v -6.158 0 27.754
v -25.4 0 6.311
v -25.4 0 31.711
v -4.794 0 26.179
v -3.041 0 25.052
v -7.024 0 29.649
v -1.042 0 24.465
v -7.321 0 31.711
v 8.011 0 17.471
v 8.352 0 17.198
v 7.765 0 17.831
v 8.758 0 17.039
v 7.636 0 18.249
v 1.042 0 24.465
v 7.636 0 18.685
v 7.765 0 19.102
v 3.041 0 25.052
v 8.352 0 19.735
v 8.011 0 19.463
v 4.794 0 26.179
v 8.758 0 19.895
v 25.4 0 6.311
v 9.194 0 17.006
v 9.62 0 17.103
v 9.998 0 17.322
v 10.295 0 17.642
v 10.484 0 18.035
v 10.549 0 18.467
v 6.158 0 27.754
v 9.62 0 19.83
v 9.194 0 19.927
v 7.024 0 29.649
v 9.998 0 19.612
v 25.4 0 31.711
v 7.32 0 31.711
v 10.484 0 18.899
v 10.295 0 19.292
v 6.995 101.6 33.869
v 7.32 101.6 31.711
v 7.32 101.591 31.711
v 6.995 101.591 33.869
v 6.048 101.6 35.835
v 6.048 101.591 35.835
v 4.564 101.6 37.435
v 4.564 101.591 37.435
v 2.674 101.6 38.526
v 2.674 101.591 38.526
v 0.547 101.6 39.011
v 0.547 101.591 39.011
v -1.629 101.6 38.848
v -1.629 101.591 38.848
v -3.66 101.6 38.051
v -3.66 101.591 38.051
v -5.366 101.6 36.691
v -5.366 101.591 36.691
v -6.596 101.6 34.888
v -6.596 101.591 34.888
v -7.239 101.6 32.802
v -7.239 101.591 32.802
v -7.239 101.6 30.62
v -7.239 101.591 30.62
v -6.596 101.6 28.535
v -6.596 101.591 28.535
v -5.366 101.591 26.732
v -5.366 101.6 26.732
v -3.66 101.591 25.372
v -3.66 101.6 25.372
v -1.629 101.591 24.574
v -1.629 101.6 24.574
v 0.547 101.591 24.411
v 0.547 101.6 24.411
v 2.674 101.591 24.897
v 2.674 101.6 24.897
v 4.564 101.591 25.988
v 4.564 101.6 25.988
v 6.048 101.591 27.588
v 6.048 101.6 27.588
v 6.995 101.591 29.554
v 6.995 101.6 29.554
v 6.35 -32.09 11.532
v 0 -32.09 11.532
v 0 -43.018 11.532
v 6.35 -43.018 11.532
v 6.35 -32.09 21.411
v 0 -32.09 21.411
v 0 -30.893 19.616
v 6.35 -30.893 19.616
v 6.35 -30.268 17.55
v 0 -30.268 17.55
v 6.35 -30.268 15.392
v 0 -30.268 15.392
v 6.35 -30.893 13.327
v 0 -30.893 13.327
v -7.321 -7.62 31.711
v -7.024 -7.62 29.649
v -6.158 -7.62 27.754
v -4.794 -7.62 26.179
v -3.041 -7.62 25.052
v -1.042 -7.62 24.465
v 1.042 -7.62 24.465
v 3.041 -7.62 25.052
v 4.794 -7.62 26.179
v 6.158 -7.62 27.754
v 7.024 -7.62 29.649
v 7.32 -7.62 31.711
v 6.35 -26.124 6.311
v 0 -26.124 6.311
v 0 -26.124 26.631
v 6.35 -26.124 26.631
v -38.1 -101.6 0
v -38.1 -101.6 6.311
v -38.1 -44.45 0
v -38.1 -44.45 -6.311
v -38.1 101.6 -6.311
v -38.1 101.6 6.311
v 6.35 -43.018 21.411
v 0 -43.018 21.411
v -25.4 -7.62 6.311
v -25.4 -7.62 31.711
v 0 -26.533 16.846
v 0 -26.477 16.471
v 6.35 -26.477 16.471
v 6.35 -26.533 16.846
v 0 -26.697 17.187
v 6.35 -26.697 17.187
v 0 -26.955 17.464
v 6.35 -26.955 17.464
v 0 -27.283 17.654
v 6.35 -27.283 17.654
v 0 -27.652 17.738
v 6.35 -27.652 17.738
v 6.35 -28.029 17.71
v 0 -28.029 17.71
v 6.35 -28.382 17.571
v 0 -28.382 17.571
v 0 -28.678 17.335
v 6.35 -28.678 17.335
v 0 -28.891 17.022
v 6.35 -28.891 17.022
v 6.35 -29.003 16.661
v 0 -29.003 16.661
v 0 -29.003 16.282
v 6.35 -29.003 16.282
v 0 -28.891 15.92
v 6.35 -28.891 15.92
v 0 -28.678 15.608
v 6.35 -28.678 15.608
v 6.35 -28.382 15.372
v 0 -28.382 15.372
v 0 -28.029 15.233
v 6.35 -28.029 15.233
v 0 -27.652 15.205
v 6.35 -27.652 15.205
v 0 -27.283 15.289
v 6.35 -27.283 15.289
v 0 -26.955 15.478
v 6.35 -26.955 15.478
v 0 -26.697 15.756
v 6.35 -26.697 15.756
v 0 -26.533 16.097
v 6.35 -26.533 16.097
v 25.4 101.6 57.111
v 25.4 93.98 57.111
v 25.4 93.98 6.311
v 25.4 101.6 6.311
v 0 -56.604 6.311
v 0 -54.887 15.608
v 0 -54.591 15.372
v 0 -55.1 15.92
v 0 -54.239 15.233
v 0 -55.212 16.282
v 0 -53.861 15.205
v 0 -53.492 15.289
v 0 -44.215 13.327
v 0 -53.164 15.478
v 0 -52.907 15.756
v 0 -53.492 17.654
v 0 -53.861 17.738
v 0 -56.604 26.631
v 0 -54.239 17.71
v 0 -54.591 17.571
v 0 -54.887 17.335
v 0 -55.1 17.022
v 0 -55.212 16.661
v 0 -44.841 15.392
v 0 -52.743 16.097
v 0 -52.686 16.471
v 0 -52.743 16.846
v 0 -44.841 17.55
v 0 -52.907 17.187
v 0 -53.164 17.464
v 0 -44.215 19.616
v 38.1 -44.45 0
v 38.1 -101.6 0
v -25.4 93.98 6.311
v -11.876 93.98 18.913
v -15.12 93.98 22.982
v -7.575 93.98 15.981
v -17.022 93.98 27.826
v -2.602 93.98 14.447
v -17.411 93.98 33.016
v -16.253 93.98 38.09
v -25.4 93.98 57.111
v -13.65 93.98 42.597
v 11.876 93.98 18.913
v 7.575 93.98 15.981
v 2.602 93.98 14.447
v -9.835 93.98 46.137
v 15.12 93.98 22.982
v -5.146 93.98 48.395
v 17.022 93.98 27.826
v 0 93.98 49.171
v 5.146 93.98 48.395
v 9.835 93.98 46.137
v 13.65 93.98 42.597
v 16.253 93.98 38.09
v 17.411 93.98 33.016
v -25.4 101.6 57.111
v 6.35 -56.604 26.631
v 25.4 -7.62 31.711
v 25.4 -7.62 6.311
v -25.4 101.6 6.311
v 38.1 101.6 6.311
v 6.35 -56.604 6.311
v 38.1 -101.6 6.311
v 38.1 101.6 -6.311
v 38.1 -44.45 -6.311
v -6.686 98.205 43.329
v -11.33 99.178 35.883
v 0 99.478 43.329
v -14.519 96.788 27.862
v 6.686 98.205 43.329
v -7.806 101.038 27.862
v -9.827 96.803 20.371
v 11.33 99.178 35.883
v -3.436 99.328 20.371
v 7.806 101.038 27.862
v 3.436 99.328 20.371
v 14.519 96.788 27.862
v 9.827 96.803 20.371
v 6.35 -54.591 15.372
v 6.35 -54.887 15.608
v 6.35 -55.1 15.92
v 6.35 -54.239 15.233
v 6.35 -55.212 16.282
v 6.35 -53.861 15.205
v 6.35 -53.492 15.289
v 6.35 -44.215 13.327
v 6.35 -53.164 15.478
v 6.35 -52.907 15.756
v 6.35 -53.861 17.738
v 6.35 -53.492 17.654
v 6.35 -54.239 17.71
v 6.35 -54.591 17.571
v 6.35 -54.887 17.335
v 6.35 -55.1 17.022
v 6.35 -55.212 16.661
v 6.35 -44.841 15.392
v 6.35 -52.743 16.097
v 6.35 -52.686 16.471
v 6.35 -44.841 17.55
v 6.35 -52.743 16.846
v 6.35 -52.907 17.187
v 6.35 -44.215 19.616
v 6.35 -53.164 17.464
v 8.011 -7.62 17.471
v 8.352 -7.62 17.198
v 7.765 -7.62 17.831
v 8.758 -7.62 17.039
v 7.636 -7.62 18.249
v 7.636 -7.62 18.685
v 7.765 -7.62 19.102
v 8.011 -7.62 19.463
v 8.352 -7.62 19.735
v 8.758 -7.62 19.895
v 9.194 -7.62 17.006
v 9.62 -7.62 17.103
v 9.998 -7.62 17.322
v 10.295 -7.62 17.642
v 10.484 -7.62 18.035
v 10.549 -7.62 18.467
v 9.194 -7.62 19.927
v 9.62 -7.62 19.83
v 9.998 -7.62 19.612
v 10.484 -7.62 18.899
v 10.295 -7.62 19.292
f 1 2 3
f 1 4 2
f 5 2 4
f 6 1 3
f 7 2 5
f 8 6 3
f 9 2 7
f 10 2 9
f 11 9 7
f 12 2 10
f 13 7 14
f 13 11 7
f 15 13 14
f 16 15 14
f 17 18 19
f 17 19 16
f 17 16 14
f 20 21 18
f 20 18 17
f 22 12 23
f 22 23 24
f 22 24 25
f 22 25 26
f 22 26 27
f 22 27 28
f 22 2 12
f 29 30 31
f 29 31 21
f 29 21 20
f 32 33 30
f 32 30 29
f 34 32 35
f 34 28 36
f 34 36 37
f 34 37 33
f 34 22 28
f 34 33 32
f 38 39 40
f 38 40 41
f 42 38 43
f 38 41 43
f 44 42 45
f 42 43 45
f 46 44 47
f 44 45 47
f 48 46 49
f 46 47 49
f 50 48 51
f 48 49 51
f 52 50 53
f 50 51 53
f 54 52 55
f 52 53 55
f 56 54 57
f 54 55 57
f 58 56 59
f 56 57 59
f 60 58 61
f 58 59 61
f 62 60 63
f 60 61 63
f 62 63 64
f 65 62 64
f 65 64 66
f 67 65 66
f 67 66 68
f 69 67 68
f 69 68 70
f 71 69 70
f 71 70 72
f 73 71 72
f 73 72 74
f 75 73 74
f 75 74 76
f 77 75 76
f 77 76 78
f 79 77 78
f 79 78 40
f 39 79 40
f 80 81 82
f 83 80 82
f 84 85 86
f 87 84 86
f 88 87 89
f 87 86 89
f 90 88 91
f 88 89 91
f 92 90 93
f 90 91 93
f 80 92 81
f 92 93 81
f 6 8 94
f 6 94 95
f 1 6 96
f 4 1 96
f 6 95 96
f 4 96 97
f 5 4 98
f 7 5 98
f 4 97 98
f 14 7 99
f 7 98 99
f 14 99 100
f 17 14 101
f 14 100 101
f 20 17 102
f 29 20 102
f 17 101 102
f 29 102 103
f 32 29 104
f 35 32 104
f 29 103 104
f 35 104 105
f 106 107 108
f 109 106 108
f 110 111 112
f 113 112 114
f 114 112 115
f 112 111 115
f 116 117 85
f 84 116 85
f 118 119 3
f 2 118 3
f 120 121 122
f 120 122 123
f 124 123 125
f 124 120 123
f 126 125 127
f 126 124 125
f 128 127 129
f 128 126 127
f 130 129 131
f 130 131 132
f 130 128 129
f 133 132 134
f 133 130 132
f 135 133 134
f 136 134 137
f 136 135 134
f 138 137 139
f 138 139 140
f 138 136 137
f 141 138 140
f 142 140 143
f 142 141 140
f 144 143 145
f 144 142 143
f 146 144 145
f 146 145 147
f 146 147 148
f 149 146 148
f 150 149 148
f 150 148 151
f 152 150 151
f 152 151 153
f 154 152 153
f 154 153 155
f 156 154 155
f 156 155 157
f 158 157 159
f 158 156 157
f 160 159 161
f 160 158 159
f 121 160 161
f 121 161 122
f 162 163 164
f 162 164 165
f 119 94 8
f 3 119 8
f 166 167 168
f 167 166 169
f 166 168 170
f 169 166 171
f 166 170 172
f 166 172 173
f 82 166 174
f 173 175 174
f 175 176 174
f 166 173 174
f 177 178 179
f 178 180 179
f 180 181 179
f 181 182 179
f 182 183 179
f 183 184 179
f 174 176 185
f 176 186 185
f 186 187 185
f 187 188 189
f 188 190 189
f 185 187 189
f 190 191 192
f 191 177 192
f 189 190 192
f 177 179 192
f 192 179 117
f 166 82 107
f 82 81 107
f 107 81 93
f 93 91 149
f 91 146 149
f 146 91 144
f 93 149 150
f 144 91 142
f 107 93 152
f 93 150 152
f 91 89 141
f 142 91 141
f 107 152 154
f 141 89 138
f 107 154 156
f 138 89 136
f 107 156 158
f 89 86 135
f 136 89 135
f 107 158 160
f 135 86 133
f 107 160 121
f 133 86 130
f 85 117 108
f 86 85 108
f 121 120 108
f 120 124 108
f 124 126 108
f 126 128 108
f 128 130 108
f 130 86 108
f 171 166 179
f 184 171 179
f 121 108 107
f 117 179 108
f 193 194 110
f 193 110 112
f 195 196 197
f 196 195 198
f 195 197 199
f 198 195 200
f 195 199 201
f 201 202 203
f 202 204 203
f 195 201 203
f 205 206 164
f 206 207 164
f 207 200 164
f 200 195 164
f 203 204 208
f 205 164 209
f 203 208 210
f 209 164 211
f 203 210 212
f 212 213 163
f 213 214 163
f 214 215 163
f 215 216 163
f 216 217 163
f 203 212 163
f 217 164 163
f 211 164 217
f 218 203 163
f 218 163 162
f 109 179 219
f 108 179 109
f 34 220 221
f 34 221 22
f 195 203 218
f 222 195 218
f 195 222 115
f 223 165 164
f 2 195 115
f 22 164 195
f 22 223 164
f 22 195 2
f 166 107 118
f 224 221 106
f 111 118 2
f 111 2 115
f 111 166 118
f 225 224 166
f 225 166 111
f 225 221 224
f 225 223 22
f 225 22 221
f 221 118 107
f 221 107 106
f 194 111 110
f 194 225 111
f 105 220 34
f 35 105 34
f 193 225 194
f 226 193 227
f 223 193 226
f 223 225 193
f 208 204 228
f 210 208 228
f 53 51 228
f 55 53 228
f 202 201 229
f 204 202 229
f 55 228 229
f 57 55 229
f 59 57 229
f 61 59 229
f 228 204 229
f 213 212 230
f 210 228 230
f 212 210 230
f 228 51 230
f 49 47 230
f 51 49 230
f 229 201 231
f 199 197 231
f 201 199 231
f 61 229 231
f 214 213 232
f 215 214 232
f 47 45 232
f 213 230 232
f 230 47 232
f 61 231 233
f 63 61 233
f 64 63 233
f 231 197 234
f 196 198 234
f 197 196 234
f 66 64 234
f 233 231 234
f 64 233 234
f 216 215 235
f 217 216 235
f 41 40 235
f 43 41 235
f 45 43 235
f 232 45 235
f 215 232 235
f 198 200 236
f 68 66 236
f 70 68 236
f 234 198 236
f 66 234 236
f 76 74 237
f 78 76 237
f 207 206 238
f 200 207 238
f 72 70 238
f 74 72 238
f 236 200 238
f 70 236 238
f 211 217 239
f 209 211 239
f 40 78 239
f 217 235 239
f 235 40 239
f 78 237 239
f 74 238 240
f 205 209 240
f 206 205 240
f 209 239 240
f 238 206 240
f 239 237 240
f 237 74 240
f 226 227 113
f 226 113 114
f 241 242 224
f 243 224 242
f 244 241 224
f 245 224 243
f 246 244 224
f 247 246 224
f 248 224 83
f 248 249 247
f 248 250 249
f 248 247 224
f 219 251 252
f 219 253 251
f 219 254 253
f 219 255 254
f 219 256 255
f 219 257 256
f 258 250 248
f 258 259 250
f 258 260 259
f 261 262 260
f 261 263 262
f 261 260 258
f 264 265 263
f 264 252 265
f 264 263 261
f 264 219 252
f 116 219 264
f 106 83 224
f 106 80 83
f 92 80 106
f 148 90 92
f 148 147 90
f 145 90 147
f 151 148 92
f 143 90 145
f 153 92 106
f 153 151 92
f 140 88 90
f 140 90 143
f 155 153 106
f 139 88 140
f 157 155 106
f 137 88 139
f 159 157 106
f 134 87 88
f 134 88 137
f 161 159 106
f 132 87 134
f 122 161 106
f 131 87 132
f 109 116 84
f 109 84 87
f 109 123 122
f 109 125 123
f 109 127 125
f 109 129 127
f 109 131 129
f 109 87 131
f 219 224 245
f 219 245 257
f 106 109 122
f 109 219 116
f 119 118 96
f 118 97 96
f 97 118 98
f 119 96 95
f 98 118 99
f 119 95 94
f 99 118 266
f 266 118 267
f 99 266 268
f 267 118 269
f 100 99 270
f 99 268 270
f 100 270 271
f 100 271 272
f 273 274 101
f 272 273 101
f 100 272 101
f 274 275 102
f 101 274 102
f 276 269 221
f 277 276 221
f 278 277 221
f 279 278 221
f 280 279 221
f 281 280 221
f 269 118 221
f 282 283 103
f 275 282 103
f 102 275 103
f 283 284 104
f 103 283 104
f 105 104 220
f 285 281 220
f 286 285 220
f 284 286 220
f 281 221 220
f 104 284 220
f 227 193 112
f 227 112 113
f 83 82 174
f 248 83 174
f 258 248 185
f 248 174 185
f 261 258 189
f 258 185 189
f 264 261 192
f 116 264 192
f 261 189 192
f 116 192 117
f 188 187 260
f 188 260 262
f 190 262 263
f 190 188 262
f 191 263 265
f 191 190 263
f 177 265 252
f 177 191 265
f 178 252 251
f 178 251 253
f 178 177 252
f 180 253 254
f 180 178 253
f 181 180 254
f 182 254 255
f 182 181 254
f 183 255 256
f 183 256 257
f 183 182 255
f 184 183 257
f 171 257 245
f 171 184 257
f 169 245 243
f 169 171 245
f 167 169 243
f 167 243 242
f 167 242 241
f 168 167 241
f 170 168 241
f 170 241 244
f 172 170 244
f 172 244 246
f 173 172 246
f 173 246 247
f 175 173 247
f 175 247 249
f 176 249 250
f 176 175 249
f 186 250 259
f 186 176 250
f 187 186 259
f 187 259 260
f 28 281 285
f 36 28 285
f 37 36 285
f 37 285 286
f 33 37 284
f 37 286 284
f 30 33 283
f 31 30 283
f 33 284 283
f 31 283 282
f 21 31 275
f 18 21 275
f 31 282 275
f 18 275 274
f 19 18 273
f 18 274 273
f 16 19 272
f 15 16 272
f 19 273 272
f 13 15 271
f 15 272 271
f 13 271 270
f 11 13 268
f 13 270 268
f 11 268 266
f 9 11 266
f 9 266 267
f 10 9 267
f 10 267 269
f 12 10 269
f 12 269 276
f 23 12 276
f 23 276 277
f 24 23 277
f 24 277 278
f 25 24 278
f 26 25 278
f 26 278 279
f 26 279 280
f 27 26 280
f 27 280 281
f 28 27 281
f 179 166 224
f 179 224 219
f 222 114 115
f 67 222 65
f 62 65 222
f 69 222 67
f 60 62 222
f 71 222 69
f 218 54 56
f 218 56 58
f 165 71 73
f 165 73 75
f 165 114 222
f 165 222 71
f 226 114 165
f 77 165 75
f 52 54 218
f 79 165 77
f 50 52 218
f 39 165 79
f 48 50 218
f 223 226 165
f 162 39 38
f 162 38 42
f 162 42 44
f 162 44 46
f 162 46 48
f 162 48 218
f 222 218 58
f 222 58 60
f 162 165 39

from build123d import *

# Parameters (mm, degrees)
F1_DEPTH  = 38.1
F0_W      = 30.48
F0_H      = 20.32
F0_R      = 1.27
F2_DEPTH  = 6.35
F0_W_2    = 7.62
F0_H_2    = 25.4
F3_DEPTH  = 25.4
F0_H_3    = 50.8
F4_DEPTH  = 25.4
F7_R      = 7.3205
F8_DEPTH  = 109.221
F9_R      = 1.464692
F10_DEPTH = 25.4


with BuildPart() as f1:
    # F0 (on Right) → F1 (new body, symmetric)
    with BuildSketch(Plane.YZ):
        Polygon((-56.604175, 6.311384), (-101.6, 6.311384), (-101.6, 0), (-44.45, 0), (-44.45, -6.311384), (101.6, -6.311384), (101.6, 6.311384), (93.98, 6.311384), (0, 6.311384), (-7.62, 6.311384), (-26.124175, 6.311384), align=None)
    extrude(amount=F1_DEPTH, both=True)

    # F0 (on Right) → F2 (join)
    with BuildSketch(Plane.YZ):
        with Locations((-41.364175, 16.471384)):
            Rectangle(F0_W, F0_H)
        with Locations((-53.956132, 16.471384)):
            Circle(F0_R, mode=Mode.SUBTRACT)
        with BuildLine():
            ThreePointArc((-32.089956, 21.411047), (-30.188175, 16.471384), (-32.089956, 11.531721))
            Line((-32.089956, 11.531721), (-43.018393, 11.531721))
            ThreePointArc((-43.018393, 11.531721), (-44.920175, 16.471384), (-43.018393, 21.411047))
            Line((-43.018393, 21.411047), (-32.089956, 21.411047))
        make_face(mode=Mode.SUBTRACT)
        with Locations((-27.746813, 16.471384)):
            Circle(F0_R, mode=Mode.SUBTRACT)
    extrude(amount=F2_DEPTH)

    # F0 (on Right) → F3 (join, symmetric)
    with BuildSketch(Plane.YZ):
        with Locations((-3.81, 19.011384)):
            Rectangle(F0_W_2, F0_H_2)
    extrude(amount=F3_DEPTH, both=True)

    # F0 (on Right) → F4 (join, symmetric)
    with BuildSketch(Plane.YZ):
        with Locations((97.79, 31.711384)):
            Rectangle(F0_W_2, F0_H_3)
    extrude(amount=F4_DEPTH, both=True)

    # F5 (on Right) → F6 (revolve, cut)
    with BuildSketch(Plane.YZ):
        with BuildLine():
            Line((81.28, 10.121384), (81.28, 53.301384))
            ThreePointArc((81.28, 53.301384), (59.69, 31.711384), (81.28, 10.121384))
        make_face()
    revolve(axis=Axis((0, 81.28, 31.711384), (0, 0, -1)), mode=Mode.SUBTRACT)

    # F7 (on face) → F8 (cut, through all)
    with BuildSketch(Plane.XZ.offset(7.62)):
        with Locations((0, 31.711384)):
            Circle(F7_R)
    extrude(amount=-F8_DEPTH, mode=Mode.SUBTRACT)

    # F9 (on face) → F10 (cut)
    with BuildSketch(Plane.XZ.offset(7.62)):
        with Locations((9.084395, 18.466871)):
            Circle(F9_R)
    extrude(amount=-F10_DEPTH, mode=Mode.SUBTRACT)


solid = f1.part
